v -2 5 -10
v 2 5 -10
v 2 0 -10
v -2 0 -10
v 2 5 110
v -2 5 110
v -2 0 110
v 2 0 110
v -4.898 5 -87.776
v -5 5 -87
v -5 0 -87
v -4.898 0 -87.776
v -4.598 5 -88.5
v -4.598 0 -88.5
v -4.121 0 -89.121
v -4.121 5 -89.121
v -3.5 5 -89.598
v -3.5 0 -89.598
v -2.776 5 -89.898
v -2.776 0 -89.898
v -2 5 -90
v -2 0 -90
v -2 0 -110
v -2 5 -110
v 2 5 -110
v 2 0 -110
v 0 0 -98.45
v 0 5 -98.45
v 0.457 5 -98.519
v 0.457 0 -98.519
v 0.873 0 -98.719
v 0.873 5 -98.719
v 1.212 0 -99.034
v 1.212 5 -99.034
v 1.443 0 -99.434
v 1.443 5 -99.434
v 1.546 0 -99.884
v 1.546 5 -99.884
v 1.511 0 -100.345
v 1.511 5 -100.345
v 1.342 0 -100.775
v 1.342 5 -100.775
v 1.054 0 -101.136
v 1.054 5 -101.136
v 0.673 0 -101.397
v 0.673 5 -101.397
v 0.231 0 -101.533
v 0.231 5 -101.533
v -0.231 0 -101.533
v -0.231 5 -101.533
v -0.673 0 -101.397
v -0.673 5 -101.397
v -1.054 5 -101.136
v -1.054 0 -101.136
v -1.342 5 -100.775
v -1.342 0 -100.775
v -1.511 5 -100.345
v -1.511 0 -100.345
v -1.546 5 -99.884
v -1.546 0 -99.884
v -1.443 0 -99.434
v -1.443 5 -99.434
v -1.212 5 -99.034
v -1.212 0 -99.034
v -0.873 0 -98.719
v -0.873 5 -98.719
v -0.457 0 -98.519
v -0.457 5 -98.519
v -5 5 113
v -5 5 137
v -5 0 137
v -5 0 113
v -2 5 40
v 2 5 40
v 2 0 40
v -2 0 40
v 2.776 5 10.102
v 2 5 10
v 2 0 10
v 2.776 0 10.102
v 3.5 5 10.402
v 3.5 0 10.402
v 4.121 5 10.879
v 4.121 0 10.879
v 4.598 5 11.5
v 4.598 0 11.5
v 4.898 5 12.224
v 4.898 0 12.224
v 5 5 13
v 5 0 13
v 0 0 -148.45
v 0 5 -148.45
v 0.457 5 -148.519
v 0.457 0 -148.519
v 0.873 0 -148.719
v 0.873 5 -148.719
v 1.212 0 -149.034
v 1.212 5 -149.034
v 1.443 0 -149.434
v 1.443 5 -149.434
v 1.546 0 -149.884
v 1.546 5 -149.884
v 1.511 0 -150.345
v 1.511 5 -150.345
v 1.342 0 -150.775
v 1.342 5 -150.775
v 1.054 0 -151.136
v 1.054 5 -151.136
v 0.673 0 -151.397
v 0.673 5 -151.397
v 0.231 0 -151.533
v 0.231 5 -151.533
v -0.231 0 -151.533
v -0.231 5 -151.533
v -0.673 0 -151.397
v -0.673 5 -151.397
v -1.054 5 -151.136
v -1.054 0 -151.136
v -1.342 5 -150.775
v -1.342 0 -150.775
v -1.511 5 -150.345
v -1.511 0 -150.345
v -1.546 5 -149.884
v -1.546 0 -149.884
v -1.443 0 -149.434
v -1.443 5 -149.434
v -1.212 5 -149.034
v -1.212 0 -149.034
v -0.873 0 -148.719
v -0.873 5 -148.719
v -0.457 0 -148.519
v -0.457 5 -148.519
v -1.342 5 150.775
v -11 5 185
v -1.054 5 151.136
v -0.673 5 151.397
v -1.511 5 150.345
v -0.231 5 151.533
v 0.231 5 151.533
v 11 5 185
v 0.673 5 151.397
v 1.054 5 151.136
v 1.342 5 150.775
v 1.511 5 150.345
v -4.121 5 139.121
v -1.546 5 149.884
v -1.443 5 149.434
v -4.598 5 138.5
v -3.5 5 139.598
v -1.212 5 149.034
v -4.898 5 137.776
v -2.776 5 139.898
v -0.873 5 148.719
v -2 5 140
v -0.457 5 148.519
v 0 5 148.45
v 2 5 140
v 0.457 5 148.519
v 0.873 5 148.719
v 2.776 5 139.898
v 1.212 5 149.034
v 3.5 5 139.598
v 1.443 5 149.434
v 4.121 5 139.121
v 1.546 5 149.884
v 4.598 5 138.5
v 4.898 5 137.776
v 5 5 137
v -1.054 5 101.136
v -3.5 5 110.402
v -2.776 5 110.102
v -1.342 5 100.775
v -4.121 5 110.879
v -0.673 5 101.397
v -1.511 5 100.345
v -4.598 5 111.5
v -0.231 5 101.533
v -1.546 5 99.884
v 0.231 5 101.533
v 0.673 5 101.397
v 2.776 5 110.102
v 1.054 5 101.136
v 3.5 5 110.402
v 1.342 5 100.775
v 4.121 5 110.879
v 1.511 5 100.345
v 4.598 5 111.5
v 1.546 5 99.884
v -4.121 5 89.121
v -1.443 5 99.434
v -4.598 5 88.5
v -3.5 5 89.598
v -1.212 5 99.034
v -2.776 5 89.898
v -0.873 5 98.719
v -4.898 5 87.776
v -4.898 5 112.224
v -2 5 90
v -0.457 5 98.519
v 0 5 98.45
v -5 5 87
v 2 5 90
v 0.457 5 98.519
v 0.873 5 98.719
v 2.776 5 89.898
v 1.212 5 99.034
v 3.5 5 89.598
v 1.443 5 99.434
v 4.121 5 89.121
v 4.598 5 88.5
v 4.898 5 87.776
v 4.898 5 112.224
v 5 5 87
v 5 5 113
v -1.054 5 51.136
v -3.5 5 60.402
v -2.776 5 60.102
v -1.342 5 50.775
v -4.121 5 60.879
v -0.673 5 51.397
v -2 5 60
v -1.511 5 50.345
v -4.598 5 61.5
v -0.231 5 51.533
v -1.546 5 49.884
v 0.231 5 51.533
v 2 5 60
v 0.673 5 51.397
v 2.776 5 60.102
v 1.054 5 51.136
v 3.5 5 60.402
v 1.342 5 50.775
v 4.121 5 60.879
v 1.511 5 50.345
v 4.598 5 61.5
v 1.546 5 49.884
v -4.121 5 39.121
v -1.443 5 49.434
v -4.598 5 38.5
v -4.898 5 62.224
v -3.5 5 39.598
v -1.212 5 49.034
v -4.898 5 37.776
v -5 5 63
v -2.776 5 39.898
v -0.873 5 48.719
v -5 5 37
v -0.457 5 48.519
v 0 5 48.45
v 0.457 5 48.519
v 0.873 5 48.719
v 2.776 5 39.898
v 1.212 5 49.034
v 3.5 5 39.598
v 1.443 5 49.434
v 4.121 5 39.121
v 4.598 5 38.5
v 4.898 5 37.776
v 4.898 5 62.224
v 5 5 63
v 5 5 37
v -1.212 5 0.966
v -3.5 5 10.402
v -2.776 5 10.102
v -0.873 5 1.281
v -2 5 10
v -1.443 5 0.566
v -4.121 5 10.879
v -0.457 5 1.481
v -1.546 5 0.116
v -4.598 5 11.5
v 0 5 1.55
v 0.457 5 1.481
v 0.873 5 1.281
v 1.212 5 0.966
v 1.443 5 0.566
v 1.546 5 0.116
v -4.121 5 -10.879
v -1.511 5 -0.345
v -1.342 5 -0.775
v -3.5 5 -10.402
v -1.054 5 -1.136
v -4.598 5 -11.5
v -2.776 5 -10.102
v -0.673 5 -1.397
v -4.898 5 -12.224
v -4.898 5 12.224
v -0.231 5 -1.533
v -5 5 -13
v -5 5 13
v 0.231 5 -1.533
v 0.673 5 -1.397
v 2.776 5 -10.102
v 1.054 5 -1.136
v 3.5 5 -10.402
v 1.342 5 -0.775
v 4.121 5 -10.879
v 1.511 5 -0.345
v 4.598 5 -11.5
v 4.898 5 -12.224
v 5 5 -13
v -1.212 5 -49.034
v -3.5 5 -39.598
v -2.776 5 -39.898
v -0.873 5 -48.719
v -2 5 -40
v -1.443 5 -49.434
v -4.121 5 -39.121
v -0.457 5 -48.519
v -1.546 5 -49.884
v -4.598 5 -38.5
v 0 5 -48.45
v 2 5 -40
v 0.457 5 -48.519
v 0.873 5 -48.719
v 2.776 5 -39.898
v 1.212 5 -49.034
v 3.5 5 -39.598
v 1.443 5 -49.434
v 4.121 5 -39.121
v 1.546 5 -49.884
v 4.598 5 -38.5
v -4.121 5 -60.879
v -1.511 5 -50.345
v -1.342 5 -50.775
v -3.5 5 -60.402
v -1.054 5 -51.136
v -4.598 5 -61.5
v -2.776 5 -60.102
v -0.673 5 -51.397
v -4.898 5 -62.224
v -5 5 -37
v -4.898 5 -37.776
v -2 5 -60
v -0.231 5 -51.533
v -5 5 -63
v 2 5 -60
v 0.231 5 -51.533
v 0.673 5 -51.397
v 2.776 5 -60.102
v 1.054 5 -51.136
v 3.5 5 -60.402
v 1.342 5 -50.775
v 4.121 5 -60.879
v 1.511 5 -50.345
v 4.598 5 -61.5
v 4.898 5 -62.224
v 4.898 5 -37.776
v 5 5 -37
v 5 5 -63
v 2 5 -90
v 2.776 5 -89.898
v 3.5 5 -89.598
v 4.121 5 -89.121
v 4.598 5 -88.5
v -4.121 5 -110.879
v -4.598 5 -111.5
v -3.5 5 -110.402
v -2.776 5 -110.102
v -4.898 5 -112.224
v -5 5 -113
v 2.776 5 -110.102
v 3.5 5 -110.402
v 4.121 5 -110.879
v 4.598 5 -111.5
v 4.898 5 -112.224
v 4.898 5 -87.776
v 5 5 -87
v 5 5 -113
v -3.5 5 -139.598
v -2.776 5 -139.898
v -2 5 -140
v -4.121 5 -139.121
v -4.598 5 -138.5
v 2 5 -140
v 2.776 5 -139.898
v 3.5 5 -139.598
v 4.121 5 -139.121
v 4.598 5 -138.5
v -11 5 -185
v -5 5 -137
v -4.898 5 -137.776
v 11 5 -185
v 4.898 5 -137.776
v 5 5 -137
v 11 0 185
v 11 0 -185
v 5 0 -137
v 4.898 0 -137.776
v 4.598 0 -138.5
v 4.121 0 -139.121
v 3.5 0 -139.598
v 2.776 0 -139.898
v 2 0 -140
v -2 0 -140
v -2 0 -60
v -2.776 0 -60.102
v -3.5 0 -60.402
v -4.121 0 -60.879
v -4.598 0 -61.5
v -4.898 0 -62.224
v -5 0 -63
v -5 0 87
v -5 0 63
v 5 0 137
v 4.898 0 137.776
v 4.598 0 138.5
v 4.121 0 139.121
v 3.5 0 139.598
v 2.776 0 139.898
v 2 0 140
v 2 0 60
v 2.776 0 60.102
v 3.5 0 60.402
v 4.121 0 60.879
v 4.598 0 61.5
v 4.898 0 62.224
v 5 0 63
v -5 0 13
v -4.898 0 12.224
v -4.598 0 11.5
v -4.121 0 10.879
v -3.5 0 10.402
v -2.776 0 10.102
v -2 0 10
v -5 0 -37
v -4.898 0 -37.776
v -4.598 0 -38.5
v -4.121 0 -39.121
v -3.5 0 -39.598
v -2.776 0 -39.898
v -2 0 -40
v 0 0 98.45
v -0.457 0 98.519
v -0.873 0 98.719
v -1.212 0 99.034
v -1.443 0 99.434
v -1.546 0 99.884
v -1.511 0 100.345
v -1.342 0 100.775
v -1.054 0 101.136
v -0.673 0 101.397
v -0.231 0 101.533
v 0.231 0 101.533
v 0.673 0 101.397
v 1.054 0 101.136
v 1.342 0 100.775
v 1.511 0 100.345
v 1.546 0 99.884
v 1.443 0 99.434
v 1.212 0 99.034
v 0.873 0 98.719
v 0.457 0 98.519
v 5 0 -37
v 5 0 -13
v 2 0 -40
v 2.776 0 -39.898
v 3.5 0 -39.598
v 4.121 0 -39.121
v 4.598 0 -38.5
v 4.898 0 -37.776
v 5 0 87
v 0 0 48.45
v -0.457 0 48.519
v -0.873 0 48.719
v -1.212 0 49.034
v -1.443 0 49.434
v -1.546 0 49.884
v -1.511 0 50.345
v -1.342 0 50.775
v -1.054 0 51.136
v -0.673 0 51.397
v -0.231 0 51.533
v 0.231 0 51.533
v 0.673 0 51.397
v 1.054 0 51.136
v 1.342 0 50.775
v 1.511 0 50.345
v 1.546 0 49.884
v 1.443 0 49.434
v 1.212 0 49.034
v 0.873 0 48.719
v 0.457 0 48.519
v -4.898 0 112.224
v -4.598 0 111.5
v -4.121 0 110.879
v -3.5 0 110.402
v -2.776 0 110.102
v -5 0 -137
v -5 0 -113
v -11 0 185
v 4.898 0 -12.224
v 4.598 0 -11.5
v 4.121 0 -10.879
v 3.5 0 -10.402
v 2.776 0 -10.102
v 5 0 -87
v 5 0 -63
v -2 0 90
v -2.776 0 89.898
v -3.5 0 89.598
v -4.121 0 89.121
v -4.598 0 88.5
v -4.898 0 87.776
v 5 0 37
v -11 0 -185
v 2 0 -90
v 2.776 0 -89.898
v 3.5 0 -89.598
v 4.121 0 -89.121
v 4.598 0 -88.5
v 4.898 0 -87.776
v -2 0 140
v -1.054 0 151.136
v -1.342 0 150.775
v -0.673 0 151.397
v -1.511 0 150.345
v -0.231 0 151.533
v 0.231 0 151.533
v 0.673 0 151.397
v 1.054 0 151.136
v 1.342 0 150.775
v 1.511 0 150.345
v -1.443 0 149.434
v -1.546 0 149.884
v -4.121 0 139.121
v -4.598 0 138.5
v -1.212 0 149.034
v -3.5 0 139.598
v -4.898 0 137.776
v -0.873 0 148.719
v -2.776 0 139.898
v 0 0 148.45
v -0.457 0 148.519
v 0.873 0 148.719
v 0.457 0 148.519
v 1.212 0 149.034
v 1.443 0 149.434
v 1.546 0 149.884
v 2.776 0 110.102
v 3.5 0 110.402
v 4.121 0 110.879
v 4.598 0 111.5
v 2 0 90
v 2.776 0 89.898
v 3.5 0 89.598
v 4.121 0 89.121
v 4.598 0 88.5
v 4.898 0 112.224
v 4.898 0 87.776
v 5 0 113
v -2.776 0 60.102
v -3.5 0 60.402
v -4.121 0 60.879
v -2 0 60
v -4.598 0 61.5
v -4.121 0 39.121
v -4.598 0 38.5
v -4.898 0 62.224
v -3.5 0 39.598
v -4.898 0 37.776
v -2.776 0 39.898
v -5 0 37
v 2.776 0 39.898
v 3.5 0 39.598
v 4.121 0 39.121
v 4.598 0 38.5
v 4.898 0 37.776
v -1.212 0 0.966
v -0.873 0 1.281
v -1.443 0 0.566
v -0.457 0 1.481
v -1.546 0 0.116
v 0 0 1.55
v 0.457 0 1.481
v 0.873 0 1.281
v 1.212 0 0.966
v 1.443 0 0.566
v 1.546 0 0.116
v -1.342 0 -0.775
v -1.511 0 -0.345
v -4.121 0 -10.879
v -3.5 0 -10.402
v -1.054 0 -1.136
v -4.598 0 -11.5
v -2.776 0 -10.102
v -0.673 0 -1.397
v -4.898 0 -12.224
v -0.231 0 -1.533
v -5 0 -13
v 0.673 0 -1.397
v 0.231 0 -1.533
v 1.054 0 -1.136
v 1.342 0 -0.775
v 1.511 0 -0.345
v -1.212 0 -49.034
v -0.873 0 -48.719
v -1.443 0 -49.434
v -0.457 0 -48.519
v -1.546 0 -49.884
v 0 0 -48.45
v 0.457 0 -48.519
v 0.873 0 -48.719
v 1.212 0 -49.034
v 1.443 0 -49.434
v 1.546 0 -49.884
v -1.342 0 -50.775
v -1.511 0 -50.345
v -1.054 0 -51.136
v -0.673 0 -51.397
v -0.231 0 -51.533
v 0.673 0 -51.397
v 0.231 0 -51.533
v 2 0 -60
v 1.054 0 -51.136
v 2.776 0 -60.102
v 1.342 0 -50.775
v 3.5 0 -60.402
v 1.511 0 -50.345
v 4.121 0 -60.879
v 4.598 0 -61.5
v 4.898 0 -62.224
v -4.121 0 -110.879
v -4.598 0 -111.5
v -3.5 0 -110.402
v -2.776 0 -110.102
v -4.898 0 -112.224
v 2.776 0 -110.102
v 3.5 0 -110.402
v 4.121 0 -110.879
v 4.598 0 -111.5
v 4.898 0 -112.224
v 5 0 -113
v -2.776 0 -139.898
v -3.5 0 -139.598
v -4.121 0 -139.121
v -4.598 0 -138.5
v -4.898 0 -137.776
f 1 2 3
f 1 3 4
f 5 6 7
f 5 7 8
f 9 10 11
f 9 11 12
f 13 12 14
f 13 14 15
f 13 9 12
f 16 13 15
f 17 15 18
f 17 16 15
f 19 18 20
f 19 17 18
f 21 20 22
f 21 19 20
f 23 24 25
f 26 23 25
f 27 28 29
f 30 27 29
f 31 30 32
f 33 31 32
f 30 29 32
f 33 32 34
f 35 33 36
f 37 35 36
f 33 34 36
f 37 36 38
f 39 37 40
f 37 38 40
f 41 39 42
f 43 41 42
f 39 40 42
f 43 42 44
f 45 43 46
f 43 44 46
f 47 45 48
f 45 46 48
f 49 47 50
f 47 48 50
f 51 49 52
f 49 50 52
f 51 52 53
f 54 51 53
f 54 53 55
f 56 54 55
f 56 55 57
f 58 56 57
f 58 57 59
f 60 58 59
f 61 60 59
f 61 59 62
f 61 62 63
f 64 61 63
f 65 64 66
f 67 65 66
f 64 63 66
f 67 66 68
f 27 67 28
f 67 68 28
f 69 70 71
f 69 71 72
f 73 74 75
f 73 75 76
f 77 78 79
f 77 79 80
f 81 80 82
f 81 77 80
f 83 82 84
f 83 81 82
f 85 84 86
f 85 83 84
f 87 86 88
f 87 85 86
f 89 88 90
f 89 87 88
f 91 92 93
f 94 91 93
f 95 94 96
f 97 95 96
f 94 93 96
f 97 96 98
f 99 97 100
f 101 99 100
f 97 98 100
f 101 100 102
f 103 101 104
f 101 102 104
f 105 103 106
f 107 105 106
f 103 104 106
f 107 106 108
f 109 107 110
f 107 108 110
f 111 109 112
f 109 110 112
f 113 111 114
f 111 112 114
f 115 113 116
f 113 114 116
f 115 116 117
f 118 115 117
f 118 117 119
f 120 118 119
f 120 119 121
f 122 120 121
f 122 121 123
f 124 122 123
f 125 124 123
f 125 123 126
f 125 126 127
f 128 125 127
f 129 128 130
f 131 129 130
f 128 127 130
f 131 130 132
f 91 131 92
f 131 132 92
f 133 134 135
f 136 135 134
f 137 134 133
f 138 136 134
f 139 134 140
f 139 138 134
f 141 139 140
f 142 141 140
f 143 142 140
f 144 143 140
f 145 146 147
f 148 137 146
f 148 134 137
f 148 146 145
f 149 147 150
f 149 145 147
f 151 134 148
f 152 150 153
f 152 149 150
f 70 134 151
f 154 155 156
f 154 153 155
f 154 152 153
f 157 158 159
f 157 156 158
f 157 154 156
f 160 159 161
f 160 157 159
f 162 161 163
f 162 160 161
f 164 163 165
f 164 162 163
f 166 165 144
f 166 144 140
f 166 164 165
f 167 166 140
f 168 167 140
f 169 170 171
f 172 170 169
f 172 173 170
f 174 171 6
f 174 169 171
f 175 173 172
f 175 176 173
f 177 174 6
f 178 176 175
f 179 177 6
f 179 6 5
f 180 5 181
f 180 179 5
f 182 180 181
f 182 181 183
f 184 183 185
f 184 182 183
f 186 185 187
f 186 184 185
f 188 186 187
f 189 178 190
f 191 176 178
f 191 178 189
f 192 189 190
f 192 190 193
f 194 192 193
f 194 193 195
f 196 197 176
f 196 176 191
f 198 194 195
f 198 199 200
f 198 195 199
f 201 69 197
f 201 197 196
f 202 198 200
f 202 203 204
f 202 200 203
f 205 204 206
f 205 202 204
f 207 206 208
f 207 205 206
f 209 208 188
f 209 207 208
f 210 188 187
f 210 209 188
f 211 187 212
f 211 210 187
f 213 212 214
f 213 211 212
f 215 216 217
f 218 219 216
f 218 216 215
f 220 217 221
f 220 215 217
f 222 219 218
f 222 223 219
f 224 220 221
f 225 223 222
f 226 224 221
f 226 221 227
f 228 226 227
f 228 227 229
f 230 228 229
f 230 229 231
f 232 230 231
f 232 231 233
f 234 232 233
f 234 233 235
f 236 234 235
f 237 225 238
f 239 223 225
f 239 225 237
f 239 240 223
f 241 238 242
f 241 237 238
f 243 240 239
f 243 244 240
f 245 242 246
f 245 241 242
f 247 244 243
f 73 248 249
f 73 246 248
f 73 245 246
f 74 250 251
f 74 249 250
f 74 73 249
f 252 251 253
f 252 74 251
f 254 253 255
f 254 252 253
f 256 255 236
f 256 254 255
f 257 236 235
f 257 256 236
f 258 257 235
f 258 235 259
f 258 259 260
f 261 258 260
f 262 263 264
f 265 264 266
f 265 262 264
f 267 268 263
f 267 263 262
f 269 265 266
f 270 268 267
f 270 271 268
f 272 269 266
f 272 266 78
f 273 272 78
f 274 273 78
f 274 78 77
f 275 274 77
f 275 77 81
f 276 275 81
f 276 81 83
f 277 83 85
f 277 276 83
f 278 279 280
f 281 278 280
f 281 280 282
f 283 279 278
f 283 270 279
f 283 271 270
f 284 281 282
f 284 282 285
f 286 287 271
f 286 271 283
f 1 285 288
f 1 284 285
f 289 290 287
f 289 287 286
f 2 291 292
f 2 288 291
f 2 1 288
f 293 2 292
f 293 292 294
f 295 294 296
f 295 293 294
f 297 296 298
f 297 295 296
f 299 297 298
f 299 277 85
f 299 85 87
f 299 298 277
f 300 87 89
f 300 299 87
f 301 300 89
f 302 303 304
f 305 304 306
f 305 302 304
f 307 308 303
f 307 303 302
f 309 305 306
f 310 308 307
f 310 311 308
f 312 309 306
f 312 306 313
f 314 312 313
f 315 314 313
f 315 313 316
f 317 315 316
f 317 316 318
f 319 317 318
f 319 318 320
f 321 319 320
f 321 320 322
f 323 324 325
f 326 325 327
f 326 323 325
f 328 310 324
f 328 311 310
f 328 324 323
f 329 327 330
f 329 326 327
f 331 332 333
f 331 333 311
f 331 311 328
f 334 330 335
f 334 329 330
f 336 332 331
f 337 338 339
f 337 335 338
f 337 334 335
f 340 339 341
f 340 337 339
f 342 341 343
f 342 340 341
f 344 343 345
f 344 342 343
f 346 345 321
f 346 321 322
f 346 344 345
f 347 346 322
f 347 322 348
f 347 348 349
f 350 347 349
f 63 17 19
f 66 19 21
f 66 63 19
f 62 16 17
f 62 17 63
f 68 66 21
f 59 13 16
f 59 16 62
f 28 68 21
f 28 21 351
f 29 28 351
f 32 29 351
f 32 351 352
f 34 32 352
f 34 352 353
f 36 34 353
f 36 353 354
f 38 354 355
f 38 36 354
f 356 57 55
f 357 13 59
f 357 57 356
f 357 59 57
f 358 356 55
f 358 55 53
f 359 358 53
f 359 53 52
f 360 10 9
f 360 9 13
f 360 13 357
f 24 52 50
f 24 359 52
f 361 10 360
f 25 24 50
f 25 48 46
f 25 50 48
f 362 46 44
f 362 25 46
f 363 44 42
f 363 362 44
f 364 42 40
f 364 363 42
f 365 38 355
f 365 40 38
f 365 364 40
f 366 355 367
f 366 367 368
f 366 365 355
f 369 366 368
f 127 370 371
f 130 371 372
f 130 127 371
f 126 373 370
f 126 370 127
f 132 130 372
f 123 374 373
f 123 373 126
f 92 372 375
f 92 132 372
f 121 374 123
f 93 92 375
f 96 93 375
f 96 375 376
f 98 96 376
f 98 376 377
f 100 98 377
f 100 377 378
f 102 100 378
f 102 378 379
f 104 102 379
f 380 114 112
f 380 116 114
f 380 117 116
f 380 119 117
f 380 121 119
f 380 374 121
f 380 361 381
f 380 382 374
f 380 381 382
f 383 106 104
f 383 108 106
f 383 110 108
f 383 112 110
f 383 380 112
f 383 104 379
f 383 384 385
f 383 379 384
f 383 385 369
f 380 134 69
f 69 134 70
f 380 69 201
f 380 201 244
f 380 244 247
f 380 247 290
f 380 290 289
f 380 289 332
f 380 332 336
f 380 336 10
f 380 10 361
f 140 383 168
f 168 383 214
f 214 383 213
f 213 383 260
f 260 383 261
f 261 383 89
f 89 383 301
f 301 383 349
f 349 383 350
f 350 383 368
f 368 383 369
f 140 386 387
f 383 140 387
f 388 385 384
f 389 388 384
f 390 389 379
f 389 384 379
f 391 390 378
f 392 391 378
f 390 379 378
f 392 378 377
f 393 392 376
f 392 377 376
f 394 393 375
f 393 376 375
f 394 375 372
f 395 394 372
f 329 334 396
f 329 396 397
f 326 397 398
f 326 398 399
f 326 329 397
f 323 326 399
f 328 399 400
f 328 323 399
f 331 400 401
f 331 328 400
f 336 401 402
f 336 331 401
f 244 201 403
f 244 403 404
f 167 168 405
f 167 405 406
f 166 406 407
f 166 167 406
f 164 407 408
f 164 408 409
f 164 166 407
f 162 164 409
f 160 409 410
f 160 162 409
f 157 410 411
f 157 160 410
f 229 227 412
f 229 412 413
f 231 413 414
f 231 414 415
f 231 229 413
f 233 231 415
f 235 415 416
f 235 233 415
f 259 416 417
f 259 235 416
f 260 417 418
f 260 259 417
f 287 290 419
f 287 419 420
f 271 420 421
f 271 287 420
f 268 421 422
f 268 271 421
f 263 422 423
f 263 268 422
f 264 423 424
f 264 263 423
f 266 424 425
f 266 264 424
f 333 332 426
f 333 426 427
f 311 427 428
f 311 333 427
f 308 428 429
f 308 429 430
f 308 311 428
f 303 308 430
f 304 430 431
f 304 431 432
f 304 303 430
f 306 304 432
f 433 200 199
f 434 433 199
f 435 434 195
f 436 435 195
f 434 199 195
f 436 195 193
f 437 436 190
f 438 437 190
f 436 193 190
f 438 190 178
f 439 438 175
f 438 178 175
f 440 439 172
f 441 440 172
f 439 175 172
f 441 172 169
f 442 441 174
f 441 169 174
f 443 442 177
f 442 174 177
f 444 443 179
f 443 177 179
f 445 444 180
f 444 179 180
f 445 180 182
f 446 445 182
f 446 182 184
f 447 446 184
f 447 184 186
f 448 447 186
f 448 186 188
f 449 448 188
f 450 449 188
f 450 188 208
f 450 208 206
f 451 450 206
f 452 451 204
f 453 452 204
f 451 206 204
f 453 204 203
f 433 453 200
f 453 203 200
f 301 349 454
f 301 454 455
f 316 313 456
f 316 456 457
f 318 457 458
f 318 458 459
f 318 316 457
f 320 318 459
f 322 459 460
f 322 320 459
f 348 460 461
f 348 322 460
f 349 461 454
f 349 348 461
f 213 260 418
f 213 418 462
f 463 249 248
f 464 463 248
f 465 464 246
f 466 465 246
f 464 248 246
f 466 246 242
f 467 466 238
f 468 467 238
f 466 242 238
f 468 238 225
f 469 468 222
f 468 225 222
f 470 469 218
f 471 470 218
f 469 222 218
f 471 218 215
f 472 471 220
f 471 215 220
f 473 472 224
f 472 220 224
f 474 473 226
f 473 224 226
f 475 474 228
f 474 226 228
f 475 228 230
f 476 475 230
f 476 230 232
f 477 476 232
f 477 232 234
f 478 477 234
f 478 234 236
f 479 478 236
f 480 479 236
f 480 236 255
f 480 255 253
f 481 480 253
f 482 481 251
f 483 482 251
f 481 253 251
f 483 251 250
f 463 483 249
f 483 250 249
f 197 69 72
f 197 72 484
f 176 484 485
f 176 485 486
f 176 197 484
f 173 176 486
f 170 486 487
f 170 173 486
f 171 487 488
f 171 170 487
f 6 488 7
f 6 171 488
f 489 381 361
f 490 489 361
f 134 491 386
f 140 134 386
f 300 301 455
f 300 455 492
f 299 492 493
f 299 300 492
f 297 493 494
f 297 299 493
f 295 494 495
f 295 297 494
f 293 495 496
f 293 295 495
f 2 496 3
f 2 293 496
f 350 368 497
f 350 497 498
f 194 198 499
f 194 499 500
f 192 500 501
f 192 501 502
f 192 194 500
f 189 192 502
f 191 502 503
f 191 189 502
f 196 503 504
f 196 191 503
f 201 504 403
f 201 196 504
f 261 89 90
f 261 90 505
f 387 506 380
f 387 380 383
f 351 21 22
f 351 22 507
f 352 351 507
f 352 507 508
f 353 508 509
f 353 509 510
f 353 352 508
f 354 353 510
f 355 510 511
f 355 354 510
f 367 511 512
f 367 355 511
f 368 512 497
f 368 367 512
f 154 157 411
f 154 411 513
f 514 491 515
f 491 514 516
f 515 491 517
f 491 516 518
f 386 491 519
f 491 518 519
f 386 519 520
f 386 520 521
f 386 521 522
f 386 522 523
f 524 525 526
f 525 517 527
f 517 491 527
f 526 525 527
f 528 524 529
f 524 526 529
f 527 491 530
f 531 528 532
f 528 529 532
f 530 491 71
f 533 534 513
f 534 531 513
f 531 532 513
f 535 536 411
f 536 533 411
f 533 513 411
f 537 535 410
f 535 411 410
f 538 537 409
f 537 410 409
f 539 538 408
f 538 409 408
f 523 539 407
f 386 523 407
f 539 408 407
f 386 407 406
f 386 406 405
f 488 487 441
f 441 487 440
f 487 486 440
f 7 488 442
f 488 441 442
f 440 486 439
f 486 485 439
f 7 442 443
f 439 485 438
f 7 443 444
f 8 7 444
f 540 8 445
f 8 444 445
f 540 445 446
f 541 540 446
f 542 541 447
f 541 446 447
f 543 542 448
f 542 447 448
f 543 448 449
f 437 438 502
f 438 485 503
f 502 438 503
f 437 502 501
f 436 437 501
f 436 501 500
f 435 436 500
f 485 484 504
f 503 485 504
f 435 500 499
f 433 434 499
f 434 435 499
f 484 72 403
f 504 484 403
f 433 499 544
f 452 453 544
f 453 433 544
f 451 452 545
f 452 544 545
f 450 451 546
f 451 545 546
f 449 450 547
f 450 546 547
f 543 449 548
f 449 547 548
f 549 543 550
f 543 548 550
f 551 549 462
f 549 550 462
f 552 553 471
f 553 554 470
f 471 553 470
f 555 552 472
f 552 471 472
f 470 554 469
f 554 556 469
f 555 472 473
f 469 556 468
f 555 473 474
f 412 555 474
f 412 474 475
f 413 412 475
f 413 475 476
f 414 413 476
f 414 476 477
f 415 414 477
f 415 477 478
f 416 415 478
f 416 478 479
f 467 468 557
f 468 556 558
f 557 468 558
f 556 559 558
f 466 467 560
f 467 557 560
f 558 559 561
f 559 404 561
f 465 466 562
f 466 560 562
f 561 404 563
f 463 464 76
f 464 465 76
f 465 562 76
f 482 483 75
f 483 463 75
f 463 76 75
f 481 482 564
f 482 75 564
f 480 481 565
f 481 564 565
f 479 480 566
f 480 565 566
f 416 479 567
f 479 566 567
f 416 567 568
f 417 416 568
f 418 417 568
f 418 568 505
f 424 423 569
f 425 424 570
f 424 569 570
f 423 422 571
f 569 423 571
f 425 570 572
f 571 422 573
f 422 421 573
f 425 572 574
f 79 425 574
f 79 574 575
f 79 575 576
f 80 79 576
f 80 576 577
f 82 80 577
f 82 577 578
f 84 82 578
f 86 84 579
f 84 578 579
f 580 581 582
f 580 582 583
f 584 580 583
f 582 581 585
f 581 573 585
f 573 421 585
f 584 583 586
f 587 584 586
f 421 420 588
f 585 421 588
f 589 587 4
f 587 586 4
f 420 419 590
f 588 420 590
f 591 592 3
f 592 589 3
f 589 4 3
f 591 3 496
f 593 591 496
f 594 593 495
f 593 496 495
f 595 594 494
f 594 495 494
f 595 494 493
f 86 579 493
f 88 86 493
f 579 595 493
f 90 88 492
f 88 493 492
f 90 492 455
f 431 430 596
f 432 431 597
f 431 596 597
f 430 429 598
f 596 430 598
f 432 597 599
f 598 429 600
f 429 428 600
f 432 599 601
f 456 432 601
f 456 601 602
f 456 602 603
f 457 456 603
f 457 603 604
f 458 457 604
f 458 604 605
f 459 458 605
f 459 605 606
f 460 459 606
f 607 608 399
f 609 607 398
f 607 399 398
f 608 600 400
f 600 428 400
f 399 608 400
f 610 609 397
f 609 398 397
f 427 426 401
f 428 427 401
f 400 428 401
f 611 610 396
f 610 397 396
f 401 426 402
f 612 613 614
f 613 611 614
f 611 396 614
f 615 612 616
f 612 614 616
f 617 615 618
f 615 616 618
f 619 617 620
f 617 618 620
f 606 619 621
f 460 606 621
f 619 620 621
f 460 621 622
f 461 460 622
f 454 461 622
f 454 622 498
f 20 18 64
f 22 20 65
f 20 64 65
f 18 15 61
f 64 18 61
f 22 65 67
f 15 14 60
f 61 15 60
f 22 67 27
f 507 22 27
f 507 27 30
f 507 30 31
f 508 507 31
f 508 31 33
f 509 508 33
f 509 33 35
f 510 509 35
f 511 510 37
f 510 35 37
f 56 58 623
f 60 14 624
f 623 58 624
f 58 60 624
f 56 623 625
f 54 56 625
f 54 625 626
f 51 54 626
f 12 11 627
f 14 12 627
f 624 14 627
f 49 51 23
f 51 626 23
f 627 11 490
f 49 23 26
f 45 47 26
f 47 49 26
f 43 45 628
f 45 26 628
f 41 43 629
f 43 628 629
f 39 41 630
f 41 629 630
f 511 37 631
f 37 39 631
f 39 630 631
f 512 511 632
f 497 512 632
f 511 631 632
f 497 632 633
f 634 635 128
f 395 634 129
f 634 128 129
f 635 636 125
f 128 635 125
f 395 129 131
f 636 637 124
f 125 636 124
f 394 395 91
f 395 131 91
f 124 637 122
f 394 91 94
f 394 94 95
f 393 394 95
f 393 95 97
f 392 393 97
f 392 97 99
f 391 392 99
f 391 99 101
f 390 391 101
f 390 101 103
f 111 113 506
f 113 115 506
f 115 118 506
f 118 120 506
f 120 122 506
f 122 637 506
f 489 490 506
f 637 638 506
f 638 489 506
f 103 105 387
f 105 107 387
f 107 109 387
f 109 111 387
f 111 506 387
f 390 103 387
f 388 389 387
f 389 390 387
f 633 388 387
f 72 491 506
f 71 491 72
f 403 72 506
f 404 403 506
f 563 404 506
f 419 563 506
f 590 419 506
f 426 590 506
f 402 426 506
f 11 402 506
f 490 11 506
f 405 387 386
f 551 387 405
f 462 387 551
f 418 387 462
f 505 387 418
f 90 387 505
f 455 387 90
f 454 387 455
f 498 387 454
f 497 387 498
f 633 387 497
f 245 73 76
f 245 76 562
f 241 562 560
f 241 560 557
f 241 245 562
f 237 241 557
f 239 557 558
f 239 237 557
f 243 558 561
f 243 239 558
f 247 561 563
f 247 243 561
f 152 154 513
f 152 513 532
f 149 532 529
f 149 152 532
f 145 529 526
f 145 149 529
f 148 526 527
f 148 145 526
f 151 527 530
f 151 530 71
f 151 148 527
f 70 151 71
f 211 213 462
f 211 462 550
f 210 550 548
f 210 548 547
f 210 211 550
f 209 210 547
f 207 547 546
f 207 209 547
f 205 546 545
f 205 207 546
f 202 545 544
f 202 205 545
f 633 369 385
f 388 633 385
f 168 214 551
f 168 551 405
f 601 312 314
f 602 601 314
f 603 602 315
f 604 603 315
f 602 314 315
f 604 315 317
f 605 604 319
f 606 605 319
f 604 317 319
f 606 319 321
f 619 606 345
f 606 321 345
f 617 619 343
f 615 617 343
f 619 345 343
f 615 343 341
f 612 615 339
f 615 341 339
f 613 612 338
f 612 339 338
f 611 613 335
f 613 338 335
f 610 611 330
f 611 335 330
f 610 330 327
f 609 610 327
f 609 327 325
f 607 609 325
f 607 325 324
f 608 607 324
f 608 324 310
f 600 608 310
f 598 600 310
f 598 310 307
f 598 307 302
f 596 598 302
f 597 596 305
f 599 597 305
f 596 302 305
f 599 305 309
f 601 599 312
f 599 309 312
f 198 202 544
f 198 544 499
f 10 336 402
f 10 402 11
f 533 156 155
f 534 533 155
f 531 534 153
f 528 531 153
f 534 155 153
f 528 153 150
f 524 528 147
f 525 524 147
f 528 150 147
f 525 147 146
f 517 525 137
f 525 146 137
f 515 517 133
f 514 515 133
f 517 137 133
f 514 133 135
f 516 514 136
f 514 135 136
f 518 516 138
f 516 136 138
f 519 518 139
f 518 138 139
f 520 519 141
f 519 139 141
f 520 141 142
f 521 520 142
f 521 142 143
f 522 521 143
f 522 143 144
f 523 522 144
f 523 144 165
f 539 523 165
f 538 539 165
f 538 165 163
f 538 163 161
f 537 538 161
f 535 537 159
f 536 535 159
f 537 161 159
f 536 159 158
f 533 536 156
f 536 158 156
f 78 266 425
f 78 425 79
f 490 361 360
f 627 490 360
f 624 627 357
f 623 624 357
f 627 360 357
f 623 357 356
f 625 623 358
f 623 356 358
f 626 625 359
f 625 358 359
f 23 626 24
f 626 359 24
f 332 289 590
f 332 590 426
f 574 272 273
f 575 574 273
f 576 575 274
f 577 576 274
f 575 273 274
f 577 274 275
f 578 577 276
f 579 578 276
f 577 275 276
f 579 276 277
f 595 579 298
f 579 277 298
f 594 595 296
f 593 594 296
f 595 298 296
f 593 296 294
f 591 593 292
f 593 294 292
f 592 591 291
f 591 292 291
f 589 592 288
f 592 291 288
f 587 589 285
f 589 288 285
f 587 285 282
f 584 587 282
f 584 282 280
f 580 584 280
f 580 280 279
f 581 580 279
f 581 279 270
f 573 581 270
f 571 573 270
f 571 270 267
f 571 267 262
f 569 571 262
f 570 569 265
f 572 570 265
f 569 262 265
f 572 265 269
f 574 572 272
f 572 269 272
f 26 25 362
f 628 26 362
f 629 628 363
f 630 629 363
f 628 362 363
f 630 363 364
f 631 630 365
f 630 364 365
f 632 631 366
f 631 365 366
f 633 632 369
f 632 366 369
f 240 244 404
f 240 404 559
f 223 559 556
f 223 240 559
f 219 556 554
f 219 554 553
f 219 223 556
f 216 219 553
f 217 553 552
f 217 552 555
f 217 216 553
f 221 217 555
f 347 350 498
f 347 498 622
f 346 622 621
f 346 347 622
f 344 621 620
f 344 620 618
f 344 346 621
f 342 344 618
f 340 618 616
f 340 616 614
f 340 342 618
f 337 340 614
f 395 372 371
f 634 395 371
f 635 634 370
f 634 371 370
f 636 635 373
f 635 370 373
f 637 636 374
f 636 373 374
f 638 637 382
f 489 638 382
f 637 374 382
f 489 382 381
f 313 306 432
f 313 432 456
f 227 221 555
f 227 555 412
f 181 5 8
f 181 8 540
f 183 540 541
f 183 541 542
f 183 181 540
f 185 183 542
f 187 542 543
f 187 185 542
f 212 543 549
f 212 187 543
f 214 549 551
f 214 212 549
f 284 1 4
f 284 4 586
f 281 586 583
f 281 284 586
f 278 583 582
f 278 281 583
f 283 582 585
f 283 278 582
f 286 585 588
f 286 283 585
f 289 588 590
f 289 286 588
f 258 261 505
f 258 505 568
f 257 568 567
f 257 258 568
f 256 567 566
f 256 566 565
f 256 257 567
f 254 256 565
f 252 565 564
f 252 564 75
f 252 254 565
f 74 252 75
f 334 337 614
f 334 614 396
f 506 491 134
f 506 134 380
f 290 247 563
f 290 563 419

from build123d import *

# Parameters (mm, degrees)
SKETCH_1_W          = 22
SKETCH_1_H          = 370
EXTRUDE_1_DEPTH     = 5
SKETCH_2_R          = 1.55
CUT_EXTRUDE_1_DEPTH = 5
CUT_EXTRUDE_2_DEPTH = 5


with BuildPart() as part:
    # 草图1 → 凸台-拉伸1 (new body)
    with BuildSketch(Plane(origin=(0, 0, 0), x_dir=(1, 0, 0), z_dir=(0, 1, 0))):
        Rectangle(SKETCH_1_W, SKETCH_1_H)
    extrude(amount=EXTRUDE_1_DEPTH)

    # 草图2 → 切除-拉伸1 (cut)
    with BuildSketch(Plane(origin=(0, 5, 0), x_dir=(1, 0, 0), z_dir=(0, 1, 0))):
        with Locations(Location((0, 0, 0), (0, 0, 270))):
            Circle(SKETCH_2_R)
        with Locations(Location((0, 50, 0), (0, 0, 270))):
            Circle(SKETCH_2_R)
        with Locations(Location((0, 100, 0), (0, 0, 270))):
            Circle(SKETCH_2_R)
        with Locations(Location((0, 150, 0), (0, 0, 270))):
            Circle(SKETCH_2_R)
        with Locations(Location((0, -150, 0), (0, 0, 90))):
            Circle(SKETCH_2_R)
        with Locations(Location((0, -100, 0), (0, 0, 90))):
            Circle(SKETCH_2_R)
        with Locations(Location((0, -50, 0), (0, 0, 90))):
            Circle(SKETCH_2_R)
    extrude(amount=-CUT_EXTRUDE_1_DEPTH, mode=Mode.SUBTRACT)

    # 草图3 → 切除-拉伸2 (cut)
    with BuildSketch(Plane(origin=(0, 5, 0), x_dir=(1, 0, 0), z_dir=(0, 1, 0))):
        with BuildLine():
            Line((-5, 63), (-5, 87))
            ThreePointArc((-5, 87), (-4.121320344, 89.121320344), (-2, 90))
            Line((-2, 90), (2, 90))
            ThreePointArc((2, 90), (4.121320344, 89.121320344), (5, 87))
            Line((5, 87), (5, 63))
            ThreePointArc((5, 63), (4.121320344, 60.878679656), (2, 60))
            Line((2, 60), (-2, 60))
            ThreePointArc((-2, 60), (-4.121320344, 60.878679656), (-5, 63))
        make_face()
        with BuildLine():
            Line((-2, 110), (2, 110))
            ThreePointArc((2, 110), (4.121320344, 110.878679656), (5, 113))
            Line((5, 113), (5, 137))
            ThreePointArc((5, 137), (4.121320344, 139.121320344), (2, 140))
            Line((2, 140), (-2, 140))
            ThreePointArc((-2, 140), (-4.121320344, 139.121320344), (-5, 137))
            Line((-5, 137), (-5, 113))
            ThreePointArc((-5, 113), (-4.121320344, 110.878679656), (-2, 110))
        make_face()
        with BuildLine():
            Line((-5, 13), (-5, 37))
            ThreePointArc((-5, 37), (-4.121320344, 39.121320344), (-2, 40))
            Line((-2, 40), (2, 40))
            ThreePointArc((2, 40), (4.121320344, 39.121320344), (5, 37))
            Line((5, 37), (5, 13))
            ThreePointArc((5, 13), (4.121320344, 10.878679656), (2, 10))
            Line((2, 10), (-2, 10))
            ThreePointArc((-2, 10), (-4.121320344, 10.878679656), (-5, 13))
        make_face()
        with BuildLine():
            Line((-5, -37), (-5, -13))
            ThreePointArc((-5, -13), (-4.121320344, -10.878679656), (-2, -10))
            Line((-2, -10), (2, -10))
            ThreePointArc((2, -10), (4.121320344, -10.878679656), (5, -13))
            Line((5, -13), (5, -37))
            ThreePointArc((5, -37), (4.121320344, -39.121320344), (2, -40))
            Line((2, -40), (-2, -40))
            ThreePointArc((-2, -40), (-4.121320344, -39.121320344), (-5, -37))
        make_face()
        with BuildLine():
            Line((-5, -87), (-5, -63))
            ThreePointArc((-5, -63), (-4.121320344, -60.878679656), (-2, -60))
            Line((-2, -60), (2, -60))
            ThreePointArc((2, -60), (4.121320344, -60.878679656), (5, -63))
            Line((5, -63), (5, -87))
            ThreePointArc((5, -87), (4.121320344, -89.121320344), (2, -90))
            Line((2, -90), (-2, -90))
            ThreePointArc((-2, -90), (-4.121320344, -89.121320344), (-5, -87))
        make_face()
        with BuildLine():
            Line((-5, -137), (-5, -113))
            ThreePointArc((-5, -113), (-4.121320344, -110.878679656), (-2, -110))
            Line((-2, -110), (2, -110))
            ThreePointArc((2, -110), (4.121320344, -110.878679656), (5, -113))
            Line((5, -113), (5, -137))
            ThreePointArc((5, -137), (4.121320344, -139.121320344), (2, -140))
            Line((2, -140), (-2, -140))
            ThreePointArc((-2, -140), (-4.121320344, -139.121320344), (-5, -137))
        make_face()
    extrude(amount=-CUT_EXTRUDE_2_DEPTH, mode=Mode.SUBTRACT)


solid = part.part
